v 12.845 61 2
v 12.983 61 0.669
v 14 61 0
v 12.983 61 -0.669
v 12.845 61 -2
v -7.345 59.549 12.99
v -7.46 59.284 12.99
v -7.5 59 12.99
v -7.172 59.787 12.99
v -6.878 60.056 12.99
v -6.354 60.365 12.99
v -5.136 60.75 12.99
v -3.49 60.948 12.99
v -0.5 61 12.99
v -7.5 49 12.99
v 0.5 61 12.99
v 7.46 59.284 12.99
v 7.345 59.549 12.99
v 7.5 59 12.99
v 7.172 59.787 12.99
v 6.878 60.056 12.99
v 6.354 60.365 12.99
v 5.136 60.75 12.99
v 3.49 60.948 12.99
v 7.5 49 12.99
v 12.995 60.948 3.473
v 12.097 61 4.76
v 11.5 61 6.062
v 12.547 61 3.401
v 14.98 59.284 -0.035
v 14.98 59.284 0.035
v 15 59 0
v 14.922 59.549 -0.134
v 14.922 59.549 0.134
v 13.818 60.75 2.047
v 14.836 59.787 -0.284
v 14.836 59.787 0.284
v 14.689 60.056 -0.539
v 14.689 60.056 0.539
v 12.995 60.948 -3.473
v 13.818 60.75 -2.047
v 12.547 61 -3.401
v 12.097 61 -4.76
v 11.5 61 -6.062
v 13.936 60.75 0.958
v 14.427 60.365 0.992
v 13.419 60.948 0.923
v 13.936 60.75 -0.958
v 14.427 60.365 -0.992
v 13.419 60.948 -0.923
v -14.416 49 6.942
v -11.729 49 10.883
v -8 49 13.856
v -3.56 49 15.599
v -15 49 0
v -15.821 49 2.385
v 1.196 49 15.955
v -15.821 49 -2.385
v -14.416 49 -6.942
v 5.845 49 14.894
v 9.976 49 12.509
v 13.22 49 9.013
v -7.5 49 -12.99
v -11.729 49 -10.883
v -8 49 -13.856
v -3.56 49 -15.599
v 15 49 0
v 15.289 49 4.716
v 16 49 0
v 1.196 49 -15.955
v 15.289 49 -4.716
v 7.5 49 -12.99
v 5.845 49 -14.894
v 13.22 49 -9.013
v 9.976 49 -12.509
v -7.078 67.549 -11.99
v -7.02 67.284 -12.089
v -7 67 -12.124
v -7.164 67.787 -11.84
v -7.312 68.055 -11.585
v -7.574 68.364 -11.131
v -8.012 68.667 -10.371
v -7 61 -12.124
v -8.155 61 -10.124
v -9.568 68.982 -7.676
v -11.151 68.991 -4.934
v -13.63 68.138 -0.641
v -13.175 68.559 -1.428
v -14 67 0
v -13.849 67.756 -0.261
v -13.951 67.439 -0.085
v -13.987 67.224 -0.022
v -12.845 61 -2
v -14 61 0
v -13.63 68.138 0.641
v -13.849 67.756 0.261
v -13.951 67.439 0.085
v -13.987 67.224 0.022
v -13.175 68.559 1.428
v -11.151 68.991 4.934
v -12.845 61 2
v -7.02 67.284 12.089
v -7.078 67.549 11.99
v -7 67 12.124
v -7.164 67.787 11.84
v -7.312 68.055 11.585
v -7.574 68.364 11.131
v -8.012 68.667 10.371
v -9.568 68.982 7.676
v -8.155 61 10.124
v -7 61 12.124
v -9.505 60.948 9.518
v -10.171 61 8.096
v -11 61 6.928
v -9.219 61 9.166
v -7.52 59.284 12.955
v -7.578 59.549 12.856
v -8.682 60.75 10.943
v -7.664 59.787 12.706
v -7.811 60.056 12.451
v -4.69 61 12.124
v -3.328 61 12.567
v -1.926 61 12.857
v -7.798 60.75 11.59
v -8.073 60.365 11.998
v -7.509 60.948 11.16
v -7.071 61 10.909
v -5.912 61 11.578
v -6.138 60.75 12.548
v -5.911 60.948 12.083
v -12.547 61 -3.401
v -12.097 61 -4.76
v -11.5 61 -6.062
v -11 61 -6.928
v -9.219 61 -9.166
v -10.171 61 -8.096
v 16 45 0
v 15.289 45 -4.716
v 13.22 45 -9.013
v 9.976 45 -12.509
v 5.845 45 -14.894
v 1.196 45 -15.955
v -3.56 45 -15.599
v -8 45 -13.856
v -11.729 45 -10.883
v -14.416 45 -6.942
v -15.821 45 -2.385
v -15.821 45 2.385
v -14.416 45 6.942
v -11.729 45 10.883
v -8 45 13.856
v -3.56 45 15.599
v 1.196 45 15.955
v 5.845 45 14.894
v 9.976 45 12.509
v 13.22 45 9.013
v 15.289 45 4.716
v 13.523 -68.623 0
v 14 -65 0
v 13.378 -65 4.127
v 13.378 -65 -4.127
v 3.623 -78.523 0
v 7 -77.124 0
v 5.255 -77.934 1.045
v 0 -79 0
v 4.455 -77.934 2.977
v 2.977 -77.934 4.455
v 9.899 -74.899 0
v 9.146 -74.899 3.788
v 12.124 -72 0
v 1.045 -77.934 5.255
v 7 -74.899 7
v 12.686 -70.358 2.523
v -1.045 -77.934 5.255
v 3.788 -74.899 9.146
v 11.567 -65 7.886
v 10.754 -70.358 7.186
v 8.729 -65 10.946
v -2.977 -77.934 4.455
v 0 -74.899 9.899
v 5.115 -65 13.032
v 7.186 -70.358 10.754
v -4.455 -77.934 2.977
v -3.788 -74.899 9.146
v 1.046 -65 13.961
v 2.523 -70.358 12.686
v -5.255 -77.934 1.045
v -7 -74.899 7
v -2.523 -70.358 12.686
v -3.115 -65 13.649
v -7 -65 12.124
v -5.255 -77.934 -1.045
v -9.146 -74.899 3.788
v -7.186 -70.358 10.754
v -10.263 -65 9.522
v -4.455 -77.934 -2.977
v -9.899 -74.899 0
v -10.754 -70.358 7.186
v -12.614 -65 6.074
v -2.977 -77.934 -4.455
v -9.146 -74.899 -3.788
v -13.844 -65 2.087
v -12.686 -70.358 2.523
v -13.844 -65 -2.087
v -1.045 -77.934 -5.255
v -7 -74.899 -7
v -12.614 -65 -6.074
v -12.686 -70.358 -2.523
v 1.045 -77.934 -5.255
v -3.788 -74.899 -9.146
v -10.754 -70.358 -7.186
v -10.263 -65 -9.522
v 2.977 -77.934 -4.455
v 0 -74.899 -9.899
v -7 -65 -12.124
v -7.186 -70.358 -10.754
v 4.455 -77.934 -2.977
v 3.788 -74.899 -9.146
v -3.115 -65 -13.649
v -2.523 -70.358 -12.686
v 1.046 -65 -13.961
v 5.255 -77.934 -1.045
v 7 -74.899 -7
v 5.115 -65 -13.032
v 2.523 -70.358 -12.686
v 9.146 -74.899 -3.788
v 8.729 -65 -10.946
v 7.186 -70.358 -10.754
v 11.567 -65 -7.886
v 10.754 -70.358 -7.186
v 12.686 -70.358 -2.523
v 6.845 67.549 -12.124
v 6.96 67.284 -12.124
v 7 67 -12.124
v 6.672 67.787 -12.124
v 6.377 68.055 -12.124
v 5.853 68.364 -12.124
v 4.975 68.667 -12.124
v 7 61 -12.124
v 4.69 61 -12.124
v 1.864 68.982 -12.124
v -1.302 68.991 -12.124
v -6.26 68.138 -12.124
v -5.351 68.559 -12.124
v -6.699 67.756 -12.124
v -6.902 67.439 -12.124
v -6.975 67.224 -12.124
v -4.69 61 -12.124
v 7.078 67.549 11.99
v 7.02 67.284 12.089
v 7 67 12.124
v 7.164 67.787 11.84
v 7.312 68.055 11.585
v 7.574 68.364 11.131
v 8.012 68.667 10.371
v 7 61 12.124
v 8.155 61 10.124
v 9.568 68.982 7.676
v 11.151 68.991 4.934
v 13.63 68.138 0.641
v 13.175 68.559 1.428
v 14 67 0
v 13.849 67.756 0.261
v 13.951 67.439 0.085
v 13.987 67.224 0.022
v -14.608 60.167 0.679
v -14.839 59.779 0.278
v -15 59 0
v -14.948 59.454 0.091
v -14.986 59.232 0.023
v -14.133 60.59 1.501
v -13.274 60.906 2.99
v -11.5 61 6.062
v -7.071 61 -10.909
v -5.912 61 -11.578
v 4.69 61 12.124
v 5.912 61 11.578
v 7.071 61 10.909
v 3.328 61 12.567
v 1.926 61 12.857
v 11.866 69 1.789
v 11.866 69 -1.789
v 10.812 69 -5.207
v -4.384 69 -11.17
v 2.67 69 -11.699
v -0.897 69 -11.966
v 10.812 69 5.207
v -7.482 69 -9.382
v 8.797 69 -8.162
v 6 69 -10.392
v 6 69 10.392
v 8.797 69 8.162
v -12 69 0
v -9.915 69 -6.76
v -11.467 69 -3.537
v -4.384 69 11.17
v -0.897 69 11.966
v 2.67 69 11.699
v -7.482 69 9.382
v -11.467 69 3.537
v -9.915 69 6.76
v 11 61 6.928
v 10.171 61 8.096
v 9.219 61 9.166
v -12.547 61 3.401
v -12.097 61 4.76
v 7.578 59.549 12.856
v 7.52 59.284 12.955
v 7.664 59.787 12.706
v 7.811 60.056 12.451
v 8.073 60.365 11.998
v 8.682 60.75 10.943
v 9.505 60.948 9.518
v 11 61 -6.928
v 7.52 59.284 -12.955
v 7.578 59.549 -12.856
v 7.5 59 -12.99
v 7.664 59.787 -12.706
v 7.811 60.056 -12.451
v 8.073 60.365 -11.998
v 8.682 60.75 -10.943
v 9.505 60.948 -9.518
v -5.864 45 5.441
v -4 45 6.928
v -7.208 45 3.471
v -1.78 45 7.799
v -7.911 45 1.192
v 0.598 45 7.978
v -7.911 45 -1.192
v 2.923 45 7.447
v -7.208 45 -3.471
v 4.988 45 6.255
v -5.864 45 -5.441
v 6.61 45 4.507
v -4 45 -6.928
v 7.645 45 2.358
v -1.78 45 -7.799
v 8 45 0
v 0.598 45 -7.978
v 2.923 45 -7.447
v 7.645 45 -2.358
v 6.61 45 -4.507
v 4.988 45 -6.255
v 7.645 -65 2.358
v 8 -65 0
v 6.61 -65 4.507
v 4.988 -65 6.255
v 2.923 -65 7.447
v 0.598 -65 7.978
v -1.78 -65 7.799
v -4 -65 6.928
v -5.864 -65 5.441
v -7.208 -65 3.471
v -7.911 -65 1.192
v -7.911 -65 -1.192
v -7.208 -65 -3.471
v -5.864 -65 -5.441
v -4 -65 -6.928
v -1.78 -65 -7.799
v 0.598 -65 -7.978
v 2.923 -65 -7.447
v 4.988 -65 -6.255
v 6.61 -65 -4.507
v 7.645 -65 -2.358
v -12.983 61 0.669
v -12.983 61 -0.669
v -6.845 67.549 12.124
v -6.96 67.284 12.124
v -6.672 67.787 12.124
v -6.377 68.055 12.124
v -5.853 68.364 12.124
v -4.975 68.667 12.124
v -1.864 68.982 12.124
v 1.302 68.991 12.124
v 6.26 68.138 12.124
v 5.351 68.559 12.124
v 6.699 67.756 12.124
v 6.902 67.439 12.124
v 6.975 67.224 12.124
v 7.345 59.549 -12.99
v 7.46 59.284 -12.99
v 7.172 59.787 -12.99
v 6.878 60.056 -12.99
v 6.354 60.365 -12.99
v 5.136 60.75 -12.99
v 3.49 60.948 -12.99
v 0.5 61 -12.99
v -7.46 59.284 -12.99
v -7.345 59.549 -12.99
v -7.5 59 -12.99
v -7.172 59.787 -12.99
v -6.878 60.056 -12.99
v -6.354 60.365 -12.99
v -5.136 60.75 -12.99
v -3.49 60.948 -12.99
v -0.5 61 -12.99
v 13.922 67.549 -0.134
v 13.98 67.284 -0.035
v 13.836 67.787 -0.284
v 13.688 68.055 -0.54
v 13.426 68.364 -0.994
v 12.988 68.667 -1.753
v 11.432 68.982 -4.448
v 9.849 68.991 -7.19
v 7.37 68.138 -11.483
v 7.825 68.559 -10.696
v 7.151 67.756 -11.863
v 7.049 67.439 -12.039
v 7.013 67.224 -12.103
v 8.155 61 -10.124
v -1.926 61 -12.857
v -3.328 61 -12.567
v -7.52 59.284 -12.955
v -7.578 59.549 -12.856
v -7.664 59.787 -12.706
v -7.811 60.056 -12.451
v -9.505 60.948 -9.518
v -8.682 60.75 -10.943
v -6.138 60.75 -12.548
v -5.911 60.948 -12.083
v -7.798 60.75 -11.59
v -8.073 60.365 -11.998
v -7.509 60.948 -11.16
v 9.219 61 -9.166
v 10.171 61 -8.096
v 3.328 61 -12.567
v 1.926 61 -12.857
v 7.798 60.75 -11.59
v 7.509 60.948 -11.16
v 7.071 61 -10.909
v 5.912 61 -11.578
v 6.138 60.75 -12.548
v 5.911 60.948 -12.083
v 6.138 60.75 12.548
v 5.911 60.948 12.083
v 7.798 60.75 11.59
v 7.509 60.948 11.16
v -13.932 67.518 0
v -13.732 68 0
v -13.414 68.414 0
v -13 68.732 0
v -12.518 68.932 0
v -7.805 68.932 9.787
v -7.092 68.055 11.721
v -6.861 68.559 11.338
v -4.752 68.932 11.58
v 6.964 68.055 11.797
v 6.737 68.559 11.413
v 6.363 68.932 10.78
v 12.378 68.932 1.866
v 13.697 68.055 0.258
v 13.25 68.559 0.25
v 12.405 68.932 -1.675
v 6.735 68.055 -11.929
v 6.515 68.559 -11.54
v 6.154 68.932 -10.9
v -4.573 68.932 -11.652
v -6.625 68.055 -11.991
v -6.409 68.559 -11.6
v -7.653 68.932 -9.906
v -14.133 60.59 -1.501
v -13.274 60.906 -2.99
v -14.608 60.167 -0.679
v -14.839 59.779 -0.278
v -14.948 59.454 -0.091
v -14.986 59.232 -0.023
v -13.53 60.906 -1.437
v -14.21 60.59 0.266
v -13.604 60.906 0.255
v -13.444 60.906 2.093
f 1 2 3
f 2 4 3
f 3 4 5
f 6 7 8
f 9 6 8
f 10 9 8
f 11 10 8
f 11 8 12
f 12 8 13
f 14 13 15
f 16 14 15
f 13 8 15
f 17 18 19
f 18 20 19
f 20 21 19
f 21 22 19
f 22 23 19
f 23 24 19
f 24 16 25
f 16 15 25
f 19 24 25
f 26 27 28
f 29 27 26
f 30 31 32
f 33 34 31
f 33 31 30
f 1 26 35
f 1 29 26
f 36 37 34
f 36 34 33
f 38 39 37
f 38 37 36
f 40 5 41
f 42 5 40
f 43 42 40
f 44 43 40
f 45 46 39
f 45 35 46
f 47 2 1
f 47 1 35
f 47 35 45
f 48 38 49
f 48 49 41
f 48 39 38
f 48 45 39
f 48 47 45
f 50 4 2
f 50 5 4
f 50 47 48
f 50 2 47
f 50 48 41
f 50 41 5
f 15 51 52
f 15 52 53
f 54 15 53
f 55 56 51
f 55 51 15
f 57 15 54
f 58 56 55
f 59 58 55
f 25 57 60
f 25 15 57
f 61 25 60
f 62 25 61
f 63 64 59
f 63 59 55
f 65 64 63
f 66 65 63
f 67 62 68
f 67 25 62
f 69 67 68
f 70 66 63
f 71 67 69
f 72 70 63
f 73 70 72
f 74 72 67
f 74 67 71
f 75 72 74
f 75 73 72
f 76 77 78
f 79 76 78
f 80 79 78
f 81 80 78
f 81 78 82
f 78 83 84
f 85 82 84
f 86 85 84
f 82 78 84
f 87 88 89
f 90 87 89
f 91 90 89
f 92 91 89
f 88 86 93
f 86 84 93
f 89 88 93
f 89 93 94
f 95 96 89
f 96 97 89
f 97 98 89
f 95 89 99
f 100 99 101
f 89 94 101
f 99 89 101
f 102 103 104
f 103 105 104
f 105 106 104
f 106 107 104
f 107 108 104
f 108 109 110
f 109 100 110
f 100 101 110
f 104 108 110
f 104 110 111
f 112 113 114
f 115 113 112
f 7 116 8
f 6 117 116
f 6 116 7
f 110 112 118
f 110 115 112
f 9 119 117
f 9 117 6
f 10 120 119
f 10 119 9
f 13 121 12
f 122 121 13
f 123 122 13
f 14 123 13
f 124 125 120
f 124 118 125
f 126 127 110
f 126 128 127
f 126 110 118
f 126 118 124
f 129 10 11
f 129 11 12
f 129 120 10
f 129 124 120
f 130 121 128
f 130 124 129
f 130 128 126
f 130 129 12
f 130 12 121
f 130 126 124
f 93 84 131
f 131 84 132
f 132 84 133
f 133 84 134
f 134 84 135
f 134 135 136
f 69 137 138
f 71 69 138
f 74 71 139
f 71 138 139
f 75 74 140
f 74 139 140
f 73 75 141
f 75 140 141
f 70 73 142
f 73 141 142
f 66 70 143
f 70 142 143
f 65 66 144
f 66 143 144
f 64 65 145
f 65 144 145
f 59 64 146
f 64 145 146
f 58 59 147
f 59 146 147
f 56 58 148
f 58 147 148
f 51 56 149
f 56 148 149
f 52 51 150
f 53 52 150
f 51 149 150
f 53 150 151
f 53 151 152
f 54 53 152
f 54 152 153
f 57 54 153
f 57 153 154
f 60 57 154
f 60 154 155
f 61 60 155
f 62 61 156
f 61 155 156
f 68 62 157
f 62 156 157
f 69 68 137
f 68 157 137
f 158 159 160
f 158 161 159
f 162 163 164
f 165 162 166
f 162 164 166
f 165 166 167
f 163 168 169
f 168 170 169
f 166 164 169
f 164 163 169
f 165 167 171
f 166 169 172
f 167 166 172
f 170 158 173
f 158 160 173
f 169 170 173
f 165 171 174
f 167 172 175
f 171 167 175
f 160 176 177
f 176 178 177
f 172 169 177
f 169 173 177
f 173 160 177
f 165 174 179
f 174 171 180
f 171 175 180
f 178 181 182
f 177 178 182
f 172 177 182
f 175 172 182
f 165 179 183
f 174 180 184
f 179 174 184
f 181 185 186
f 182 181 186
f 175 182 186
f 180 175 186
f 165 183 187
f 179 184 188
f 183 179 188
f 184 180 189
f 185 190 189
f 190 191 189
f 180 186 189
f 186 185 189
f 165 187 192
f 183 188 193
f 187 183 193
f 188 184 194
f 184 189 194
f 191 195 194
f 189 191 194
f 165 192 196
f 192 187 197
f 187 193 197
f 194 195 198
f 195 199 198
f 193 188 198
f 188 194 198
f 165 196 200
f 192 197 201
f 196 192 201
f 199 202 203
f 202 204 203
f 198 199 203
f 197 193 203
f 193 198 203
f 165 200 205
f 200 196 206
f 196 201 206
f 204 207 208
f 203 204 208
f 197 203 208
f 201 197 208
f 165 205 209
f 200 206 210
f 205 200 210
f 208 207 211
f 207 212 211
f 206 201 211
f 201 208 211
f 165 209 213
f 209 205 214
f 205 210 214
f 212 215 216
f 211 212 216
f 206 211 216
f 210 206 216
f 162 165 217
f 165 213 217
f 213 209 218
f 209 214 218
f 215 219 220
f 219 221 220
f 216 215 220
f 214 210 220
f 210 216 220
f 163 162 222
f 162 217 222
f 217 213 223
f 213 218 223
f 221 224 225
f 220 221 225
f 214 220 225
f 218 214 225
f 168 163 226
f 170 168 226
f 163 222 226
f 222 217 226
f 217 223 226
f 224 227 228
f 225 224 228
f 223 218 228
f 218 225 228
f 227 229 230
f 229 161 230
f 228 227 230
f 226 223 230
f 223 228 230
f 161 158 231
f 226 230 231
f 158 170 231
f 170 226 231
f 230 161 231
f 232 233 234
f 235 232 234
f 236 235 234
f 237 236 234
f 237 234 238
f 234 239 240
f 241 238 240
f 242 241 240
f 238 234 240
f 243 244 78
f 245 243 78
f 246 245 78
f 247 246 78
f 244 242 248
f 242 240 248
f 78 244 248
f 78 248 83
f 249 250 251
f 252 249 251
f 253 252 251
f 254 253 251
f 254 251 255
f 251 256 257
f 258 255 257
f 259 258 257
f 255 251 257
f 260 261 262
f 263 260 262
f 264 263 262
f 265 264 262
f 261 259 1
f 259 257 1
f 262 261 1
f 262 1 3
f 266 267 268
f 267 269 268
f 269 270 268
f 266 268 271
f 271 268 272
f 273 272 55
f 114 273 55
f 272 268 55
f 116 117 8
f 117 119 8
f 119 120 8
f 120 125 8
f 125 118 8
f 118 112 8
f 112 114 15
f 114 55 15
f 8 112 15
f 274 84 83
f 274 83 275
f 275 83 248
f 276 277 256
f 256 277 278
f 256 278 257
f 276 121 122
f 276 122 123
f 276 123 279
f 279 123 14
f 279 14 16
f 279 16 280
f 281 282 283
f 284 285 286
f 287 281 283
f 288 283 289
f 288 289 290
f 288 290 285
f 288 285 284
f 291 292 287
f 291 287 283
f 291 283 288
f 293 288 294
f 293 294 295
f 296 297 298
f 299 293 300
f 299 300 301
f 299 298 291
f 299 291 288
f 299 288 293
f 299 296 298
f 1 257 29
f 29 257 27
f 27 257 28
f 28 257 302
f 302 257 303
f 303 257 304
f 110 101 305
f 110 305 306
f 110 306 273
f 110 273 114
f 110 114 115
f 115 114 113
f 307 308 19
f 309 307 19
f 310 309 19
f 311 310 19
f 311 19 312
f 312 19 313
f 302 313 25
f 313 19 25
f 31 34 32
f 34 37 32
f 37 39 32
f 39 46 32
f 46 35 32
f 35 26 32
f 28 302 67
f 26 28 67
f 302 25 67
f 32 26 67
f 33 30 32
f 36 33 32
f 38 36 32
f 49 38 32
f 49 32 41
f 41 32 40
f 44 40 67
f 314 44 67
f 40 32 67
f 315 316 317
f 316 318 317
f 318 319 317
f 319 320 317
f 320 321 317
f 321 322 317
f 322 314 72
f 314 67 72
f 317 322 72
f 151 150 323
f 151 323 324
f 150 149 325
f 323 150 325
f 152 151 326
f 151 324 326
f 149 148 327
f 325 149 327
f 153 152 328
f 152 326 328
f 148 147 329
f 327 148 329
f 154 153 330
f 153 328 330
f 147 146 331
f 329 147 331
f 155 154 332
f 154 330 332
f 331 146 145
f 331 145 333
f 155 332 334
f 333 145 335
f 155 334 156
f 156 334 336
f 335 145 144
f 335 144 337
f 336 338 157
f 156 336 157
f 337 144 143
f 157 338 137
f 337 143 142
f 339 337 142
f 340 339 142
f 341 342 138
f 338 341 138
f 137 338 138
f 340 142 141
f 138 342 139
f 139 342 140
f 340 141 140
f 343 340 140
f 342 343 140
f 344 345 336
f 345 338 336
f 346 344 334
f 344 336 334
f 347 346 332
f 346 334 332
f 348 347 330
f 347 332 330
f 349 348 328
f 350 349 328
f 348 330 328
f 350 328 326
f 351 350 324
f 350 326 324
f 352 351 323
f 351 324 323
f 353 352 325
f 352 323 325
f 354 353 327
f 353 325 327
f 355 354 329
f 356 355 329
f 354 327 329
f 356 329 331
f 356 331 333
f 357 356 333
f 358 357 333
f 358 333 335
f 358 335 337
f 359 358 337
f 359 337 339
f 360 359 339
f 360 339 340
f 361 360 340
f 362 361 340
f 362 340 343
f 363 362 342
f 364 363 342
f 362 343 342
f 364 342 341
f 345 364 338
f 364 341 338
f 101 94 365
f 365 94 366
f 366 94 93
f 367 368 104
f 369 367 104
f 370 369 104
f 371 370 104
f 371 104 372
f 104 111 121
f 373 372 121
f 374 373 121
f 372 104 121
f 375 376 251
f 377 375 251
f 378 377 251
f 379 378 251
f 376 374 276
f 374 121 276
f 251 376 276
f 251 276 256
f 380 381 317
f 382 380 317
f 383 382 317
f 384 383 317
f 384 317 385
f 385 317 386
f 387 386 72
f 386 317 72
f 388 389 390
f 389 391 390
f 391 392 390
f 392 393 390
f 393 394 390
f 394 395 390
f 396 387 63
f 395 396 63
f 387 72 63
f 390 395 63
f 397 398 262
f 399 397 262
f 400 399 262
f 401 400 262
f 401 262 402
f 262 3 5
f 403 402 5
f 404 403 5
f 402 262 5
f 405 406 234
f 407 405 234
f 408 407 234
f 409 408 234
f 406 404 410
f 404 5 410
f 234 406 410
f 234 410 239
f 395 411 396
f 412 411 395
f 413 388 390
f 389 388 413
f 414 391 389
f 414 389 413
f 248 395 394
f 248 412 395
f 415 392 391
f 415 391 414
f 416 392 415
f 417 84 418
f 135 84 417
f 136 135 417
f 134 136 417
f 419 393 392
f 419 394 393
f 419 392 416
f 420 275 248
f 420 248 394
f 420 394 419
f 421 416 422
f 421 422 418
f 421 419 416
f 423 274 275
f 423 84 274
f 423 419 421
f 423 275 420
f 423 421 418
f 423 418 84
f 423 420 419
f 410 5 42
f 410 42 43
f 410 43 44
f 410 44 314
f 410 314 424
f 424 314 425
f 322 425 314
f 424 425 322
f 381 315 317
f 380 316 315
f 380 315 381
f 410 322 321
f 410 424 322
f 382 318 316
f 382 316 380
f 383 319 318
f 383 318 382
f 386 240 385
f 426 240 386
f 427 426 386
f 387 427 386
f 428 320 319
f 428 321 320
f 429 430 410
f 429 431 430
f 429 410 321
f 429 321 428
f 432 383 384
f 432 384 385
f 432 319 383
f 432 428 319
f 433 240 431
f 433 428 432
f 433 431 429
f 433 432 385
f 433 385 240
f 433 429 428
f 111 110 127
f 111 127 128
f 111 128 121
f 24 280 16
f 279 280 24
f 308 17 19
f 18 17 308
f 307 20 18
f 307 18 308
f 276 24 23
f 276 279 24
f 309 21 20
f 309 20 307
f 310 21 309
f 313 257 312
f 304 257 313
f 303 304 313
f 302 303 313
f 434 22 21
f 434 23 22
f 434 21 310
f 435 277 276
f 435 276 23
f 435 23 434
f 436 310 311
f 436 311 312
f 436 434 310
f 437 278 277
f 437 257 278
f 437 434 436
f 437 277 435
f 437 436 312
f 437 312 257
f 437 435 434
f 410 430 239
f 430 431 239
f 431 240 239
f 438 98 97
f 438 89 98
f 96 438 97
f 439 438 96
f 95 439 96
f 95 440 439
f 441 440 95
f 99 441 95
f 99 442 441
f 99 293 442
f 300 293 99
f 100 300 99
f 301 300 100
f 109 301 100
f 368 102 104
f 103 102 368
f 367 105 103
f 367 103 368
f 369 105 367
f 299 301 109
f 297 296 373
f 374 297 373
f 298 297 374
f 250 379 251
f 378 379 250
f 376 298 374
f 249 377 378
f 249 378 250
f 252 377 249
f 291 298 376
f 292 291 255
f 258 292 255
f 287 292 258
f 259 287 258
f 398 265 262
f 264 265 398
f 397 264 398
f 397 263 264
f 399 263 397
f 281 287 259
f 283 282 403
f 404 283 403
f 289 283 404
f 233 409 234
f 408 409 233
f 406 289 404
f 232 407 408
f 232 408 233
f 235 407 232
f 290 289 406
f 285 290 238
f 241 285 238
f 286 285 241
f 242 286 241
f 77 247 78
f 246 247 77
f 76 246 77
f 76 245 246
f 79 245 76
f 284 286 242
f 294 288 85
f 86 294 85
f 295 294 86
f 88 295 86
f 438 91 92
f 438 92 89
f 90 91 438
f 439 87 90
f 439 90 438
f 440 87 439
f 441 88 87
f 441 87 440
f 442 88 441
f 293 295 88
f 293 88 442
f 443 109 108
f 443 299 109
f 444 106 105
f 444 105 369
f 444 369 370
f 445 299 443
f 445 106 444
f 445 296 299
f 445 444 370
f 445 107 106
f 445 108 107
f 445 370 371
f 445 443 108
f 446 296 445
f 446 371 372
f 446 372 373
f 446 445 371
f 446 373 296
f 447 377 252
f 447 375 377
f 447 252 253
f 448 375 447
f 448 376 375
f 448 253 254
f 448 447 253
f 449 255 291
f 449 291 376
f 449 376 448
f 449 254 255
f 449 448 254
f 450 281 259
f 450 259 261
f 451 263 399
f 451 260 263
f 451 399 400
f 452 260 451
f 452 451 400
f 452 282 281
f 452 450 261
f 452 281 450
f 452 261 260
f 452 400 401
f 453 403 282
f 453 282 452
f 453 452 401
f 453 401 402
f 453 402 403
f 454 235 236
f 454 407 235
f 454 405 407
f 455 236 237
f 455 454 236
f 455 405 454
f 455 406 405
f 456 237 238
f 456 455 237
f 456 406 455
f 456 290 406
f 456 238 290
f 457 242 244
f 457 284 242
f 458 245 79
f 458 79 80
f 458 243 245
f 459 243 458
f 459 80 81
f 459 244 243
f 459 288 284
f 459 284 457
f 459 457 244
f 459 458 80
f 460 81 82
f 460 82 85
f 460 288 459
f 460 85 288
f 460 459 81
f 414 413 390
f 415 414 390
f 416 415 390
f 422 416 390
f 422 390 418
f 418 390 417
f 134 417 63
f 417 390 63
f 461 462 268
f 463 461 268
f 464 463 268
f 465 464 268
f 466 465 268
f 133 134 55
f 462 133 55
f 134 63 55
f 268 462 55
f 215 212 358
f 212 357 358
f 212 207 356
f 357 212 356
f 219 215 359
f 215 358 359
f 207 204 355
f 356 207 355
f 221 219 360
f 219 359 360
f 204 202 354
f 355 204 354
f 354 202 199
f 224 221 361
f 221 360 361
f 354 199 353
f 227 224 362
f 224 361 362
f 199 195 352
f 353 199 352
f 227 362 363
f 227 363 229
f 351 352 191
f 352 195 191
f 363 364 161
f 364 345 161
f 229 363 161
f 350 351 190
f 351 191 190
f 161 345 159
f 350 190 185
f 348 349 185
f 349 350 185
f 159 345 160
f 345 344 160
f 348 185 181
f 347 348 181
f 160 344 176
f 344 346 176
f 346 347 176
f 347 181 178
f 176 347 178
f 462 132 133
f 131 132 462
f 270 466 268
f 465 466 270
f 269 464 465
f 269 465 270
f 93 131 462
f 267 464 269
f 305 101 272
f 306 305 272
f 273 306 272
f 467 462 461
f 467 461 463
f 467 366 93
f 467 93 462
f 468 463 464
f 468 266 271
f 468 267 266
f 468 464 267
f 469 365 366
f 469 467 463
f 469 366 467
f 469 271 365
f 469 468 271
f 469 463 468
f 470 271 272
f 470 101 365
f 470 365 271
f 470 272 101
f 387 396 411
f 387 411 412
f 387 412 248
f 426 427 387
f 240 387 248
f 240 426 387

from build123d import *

# Parameters (mm, degrees)
SKETCH2_R           = 16
BOSS_EXTRUDE1_DEPTH = 4
BOSS_EXTRUDE2_DEPTH = 12
BOSS_EXTRUDE3_DEPTH = 8


with BuildPart() as part:
    # Sketch1 → Revolve1 (revolve)
    with BuildSketch(Plane.XY):
        with BuildLine():
            Line((0, 45), (0, -79))
            ThreePointArc((0, -79), (9.899494937, -74.899494937), (14, -65))
            Line((14, -65), (8, -65))
            Line((8, -65), (8, 45))
            Line((8, 45), (0, 45))
        make_face()
    revolve(axis=Axis((0, 45, 0), (0, -1, 0)))

    # Sketch2 → Boss-Extrude1 (add)
    with BuildSketch(Plane(origin=(0, 45, 0), x_dir=(1, 0, 0), z_dir=(0, 1, 0))):
        Circle(SKETCH2_R)
    extrude(amount=BOSS_EXTRUDE1_DEPTH)

    # Sketch3 → Boss-Extrude2 (add)
    with BuildSketch(Plane(origin=(0, 49, 0), x_dir=(1, 0, 0), z_dir=(0, 1, 0))):
        Polygon((15, 0), (7.5, 12.990381057), (-7.5, 12.990381057), (-15, 0), (-7.5, -12.990381057), (7.5, -12.990381057), align=None)
    extrude(amount=BOSS_EXTRUDE2_DEPTH)

    # Sketch4 → Cut-Revolve1 (revolve, cut)
    with BuildSketch(Plane.XY):
        with BuildLine():
            Line((-11.25, 61), (-11.845920892, 86.206852949))
            Line((-11.845920892, 86.206852949), (-19.210159843, 81.730550841))
            Line((-19.210159843, 81.730550841), (-15, 77.218149523))
            Line((-15, 77.218149523), (-15, 59))
            ThreePointArc((-15, 59), (-14.414213562, 60.414213562), (-13, 61))
            Line((-13, 61), (-11.25, 61))
        make_face()
    revolve(axis=Axis((0, 61, 0), (0, 1, 0)), mode=Mode.SUBTRACT)

    # Sketch5 → Boss-Extrude3 (add)
    with BuildSketch(Plane(origin=(0, 61, 0), x_dir=(1, 0, 0), z_dir=(0, 1, 0))):
        Polygon((14, 0), (7, 12.124355653), (-7, 12.124355653), (-14, 0), (-7, -12.124355653), (7, -12.124355653), align=None)
    extrude(amount=BOSS_EXTRUDE3_DEPTH)

    # Sketch7 → Cut-Revolve4 (revolve, cut)
    with BuildSketch(Plane.XY):
        with BuildLine():
            Line((-10.420461745, 69), (-11.491114181, 93.356215437))
            Line((-11.491114181, 93.356215437), (-17.705025471, 88.394162347))
            Line((-17.705025471, 88.394162347), (-14, 85.377305621))
            Line((-14, 85.377305621), (-14, 67))
            ThreePointArc((-14, 67), (-13.414213562, 68.414213562), (-12, 69))
            Line((-12, 69), (-10.420461745, 69))
        make_face()
    revolve(axis=Axis((0, 69, 0), (0, 1, 0)), mode=Mode.SUBTRACT)


solid = part.part
